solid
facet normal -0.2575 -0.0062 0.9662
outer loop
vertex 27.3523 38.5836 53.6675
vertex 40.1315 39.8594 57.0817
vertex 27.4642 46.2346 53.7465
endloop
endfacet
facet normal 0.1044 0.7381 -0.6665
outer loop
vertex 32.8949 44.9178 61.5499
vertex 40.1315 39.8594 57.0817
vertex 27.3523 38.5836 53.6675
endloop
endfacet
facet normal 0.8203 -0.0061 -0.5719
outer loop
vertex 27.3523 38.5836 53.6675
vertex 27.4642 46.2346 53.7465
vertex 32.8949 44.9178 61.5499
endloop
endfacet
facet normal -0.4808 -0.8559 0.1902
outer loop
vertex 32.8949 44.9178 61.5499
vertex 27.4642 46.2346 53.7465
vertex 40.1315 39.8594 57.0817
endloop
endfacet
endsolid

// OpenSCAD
// Auto-generated auxetic polyhedron
points = [
    [27.464187, 46.234568, 53.746520],
    [40.131450, 39.859398, 57.081696],
    [27.352267, 38.583572, 53.667513],
    [32.894885, 44.917818, 61.549918],
];

faces = [
    [0, 1, 2],
    [2, 1, 3],
    [3, 0, 2],
    [1, 0, 3],
];

polyhedron(points = points, faces = faces);
